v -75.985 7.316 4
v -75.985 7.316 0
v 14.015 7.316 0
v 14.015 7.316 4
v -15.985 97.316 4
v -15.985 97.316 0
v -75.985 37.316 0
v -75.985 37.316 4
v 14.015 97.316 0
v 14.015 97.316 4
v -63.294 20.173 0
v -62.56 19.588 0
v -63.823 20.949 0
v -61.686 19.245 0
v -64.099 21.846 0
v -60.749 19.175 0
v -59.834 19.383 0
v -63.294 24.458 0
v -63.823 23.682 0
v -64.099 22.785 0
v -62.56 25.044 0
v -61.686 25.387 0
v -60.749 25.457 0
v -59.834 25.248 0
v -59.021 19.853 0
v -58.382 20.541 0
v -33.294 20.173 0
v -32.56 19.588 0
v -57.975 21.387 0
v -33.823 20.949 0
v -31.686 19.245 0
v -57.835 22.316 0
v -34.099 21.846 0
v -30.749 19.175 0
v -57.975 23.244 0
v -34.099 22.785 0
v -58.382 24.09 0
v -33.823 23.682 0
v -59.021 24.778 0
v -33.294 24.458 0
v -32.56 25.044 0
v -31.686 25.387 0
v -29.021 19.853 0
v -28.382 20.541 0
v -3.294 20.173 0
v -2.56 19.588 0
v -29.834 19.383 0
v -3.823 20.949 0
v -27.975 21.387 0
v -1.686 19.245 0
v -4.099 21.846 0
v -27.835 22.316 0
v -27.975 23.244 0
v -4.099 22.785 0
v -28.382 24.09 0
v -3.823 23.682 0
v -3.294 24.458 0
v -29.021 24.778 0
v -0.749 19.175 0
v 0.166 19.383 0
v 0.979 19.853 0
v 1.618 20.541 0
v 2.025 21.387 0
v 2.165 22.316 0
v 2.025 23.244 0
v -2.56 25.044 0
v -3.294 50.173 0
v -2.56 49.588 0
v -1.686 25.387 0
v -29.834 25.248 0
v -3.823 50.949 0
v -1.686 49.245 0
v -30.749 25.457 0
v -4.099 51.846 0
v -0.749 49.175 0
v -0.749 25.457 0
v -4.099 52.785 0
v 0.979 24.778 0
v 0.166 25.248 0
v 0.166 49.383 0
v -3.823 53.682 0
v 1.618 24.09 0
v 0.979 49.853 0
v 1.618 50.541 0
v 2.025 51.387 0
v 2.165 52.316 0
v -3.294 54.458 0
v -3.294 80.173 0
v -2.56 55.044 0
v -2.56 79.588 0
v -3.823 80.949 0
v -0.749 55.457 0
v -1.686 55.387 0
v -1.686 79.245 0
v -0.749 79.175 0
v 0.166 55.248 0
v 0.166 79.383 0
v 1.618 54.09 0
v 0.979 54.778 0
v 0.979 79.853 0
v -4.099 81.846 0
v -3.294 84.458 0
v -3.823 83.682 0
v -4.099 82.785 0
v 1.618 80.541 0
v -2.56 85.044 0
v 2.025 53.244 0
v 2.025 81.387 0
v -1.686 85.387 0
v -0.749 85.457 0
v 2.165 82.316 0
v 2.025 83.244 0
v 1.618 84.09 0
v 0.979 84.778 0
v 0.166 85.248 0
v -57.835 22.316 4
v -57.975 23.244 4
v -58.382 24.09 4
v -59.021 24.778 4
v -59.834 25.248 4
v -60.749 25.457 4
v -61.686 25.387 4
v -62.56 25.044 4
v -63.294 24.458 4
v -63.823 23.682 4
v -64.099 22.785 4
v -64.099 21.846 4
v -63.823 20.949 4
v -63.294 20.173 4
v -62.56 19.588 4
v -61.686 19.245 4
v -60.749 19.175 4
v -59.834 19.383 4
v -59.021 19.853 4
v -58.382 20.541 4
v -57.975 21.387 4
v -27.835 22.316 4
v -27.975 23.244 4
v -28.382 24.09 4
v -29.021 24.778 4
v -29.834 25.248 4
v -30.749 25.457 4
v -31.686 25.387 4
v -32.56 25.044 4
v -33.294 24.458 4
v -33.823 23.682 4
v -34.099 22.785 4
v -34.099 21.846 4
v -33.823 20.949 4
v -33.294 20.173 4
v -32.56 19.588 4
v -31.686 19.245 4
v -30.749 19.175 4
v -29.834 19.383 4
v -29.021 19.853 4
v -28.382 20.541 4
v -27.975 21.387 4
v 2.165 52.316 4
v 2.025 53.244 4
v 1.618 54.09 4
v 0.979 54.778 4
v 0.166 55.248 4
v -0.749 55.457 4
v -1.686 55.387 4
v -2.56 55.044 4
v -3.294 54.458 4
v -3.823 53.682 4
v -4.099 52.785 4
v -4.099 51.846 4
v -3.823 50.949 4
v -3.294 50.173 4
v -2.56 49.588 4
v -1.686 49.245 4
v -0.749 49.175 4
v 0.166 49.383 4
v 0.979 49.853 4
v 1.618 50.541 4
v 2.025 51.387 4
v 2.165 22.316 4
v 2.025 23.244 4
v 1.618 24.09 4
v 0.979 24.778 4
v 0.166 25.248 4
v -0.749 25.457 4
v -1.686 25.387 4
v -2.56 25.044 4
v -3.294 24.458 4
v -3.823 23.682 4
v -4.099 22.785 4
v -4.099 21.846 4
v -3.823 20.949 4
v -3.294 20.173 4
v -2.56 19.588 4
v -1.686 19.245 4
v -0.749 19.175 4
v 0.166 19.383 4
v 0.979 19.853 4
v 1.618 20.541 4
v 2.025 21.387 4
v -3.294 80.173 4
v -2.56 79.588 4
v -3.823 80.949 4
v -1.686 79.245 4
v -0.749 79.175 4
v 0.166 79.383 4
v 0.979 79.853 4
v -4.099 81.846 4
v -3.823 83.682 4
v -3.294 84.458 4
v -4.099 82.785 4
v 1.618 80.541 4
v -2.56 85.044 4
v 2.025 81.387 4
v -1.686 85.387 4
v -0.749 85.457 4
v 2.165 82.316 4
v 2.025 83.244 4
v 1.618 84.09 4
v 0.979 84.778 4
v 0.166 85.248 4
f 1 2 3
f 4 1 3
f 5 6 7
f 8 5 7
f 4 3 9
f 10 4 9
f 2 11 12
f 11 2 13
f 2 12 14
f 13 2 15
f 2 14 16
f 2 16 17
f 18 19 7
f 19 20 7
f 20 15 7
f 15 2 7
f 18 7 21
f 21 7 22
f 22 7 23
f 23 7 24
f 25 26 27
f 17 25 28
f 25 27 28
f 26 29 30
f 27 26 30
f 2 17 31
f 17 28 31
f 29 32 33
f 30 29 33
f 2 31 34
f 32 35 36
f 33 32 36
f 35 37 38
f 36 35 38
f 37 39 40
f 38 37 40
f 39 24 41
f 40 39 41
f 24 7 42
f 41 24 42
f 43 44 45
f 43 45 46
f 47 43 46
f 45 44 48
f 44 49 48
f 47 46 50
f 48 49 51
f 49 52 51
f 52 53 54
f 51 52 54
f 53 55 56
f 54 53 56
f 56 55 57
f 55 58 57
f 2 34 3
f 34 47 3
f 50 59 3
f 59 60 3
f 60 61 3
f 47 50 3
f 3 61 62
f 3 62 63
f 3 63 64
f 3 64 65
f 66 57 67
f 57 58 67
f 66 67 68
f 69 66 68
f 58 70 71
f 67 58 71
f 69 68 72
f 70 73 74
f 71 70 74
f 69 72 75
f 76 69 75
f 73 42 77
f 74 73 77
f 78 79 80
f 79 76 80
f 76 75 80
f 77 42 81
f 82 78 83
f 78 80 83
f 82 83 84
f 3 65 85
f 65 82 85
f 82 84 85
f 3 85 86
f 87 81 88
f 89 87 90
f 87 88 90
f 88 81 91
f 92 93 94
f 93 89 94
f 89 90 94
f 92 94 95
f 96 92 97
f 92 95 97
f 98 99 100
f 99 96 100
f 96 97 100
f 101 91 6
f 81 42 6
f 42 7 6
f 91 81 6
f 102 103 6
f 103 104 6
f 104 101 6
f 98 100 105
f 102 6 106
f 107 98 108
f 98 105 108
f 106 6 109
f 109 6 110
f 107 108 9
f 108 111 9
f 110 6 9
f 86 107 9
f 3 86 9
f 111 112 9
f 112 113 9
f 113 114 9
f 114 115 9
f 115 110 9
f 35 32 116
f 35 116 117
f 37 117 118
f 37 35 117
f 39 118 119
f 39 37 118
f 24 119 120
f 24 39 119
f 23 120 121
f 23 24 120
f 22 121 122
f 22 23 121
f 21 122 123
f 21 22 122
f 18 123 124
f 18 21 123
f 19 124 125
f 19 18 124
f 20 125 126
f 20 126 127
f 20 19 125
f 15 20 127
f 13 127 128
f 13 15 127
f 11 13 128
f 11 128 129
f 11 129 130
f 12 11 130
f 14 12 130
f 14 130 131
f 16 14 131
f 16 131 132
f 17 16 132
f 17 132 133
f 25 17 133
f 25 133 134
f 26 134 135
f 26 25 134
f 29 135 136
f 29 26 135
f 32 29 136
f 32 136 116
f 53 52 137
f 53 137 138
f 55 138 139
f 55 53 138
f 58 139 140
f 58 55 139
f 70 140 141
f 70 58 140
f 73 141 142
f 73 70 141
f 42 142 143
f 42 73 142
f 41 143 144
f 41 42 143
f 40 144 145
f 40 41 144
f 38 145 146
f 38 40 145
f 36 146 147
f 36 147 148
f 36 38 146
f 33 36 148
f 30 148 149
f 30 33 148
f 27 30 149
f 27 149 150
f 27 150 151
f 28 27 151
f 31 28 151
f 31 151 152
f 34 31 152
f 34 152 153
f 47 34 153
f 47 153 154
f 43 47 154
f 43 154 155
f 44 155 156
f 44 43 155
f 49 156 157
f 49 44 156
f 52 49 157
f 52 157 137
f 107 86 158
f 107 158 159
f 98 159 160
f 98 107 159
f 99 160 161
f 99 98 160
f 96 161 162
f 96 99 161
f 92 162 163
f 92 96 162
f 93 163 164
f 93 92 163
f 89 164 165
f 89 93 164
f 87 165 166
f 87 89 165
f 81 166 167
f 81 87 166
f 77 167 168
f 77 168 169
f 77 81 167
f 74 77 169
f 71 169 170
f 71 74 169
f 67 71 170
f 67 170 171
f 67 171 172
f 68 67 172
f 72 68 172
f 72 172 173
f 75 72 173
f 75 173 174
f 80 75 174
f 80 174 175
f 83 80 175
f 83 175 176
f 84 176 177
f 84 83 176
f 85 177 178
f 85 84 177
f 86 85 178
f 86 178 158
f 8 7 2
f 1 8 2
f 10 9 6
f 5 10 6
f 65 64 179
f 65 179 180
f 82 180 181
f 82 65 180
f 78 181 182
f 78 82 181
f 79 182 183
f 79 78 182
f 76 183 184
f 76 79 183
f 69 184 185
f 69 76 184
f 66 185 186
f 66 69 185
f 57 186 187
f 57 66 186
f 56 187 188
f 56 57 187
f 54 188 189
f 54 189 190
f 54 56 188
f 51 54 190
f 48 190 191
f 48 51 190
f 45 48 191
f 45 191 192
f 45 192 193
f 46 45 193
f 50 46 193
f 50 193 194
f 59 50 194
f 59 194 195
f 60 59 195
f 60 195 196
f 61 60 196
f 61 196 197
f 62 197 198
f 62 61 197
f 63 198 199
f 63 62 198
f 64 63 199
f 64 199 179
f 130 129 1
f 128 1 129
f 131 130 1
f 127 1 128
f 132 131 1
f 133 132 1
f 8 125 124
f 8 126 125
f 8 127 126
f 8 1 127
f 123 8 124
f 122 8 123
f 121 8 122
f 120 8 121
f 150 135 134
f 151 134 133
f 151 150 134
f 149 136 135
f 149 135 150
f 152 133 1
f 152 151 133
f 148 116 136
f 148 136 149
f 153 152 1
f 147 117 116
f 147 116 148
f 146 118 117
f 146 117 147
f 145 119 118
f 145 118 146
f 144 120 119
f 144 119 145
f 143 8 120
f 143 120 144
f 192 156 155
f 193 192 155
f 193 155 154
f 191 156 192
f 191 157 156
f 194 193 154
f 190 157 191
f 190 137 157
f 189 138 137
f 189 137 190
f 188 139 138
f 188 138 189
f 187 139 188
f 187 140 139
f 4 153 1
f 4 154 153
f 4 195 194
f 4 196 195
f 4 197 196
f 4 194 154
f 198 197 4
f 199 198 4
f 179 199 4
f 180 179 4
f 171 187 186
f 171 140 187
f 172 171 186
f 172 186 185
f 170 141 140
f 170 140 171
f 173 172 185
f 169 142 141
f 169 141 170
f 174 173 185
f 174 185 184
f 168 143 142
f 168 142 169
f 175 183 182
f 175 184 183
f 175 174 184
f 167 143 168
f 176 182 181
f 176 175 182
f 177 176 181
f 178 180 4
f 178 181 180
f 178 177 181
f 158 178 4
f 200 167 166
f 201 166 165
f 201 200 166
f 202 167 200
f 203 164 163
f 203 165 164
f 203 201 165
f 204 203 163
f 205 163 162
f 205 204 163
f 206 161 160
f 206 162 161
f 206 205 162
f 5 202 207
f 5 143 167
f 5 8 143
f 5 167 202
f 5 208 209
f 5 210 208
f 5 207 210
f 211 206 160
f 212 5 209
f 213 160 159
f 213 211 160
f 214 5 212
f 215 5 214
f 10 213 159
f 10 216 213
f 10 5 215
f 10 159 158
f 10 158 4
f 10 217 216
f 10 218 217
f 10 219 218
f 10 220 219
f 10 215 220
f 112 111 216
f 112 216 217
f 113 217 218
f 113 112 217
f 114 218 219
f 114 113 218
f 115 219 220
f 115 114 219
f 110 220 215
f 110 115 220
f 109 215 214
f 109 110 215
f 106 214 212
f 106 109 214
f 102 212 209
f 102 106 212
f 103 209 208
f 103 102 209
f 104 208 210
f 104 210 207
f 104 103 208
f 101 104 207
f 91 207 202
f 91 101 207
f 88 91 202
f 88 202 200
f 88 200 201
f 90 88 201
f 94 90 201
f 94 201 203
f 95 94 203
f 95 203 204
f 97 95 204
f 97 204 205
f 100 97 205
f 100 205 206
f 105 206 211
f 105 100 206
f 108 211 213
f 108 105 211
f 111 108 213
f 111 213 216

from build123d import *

# Parameters (mm, degrees)
SKETCH1_R      = 3.15
EXTRUDE1_DEPTH = 4


with BuildPart() as part:
    # Sketch1 → Extrude1 (new body)
    with BuildSketch(Plane.XY):
        Polygon((14.015385947, 97.315723434), (-15.984614053, 97.315723434), (-75.984614053, 37.315723434), (-75.984614053, 7.315723434), (14.015385947, 7.315723434), align=None)
        with Locations((-0.984614053, 52.315723434)):
            Circle(SKETCH1_R, mode=Mode.SUBTRACT)
        with Locations((-0.984614053, 82.315723434)):
            Circle(SKETCH1_R, mode=Mode.SUBTRACT)
        with Locations((-0.984614053, 22.315723434)):
            Circle(SKETCH1_R, mode=Mode.SUBTRACT)
        with Locations((-30.984614053, 22.315723434)):
            Circle(SKETCH1_R, mode=Mode.SUBTRACT)
        with Locations((-60.984614053, 22.315723434)):
            Circle(SKETCH1_R, mode=Mode.SUBTRACT)
    extrude(amount=EXTRUDE1_DEPTH)


solid = part.part
